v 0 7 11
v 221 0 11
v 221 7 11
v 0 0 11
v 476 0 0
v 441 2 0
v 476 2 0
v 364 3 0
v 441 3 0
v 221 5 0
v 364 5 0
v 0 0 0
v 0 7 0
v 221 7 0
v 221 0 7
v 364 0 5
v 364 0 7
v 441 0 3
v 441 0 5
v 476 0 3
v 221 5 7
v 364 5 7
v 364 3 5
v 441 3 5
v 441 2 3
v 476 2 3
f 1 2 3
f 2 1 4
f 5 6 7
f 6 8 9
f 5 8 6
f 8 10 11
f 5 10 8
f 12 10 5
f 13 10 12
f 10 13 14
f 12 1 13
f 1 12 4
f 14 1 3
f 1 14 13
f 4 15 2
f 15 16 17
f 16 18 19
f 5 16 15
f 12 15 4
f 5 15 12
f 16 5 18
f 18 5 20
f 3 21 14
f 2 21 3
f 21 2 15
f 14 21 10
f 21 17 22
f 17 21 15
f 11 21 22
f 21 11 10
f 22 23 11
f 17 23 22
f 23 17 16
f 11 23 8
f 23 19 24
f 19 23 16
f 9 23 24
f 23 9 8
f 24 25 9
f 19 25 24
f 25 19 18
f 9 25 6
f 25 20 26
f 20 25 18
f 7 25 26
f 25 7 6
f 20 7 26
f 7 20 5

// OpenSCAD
translate([6.5, 3.5, 5.5]) color([0.7000796910311562, 0.6489922579129634, 0.19497362064878687]) cube([13, 7, 11], center=true);
translate([19.5, 3.5, 5.5]) color([0.7834169698984913, 0.7774609885388588, 0.11099692345616674]) cube([13, 7, 11], center=true);
translate([32.5, 3.5, 5.5]) color([0.060160827712116616, 0.7008174245595068, 0.6143308403515266]) cube([13, 7, 11], center=true);
translate([45.5, 3.5, 5.5]) color([0.9339155207415325, 0.6504721799814983, 0.9694854220936419]) cube([13, 7, 11], center=true);
translate([58.5, 3.5, 5.5]) color([0.7136168898793864, 0.2963863893491513, 0.8491315553121948]) cube([13, 7, 11], center=true);
translate([71.5, 3.5, 5.5]) color([0.95846907728749, 0.38764569013819994, 0.29380353478258403]) cube([13, 7, 11], center=true);
translate([84.5, 3.5, 5.5]) color([0.7457841029207014, 0.9575468650535228, 0.98339807845839]) cube([13, 7, 11], center=true);
translate([97.5, 3.5, 5.5]) color([0.12155240415787172, 0.8604321836344089, 0.9958411320233901]) cube([13, 7, 11], center=true);
translate([110.5, 3.5, 5.5]) color([0.03818441020037311, 0.39202639046743215, 0.3715816420064585]) cube([13, 7, 11], center=true);
translate([123.5, 3.5, 5.5]) color([0.19047756087385292, 0.3565538137373233, 0.6320134108911423]) cube([13, 7, 11], center=true);
translate([136.5, 3.5, 5.5]) color([0.9564975354421206, 0.901927522825372, 0.039980675922074105]) cube([13, 7, 11], center=true);
translate([149.5, 3.5, 5.5]) color([0.2553863294502452, 0.02665600139486224, 0.5200631817170318]) cube([13, 7, 11], center=true);
translate([162.5, 3.5, 5.5]) color([0.5692567569896342, 0.8758772851227178, 0.2296552367022351]) cube([13, 7, 11], center=true);
translate([175.5, 3.5, 5.5]) color([0.7763426439418957, 0.8846860519705121, 0.6274277551427163]) cube([13, 7, 11], center=true);
translate([188.5, 3.5, 5.5]) color([0.5024128608294012, 0.5237115354844265, 0.5071067236759631]) cube([13, 7, 11], center=true);
translate([201.5, 3.5, 5.5]) color([0.9454855480301745, 0.14569042195357562, 0.8918421087116969]) cube([13, 7, 11], center=true);
translate([214.5, 3.5, 5.5]) color([0.42205651792049836, 0.08403205823715598, 0.1047646210762947]) cube([13, 7, 11], center=true);
translate([226.5, 2.5, 3.5]) color([0.06292282863863541, 0.4151614515022839, 0.15615697007089357]) cube([11, 5, 7], center=true);
translate([237.5, 2.5, 3.5]) color([0.9545538427732947, 0.7913428503775491, 0.43108631436838285]) cube([11, 5, 7], center=true);
translate([248.5, 2.5, 3.5]) color([0.41701950900356644, 0.4966247746294912, 0.86405767472269]) cube([11, 5, 7], center=true);
translate([259.5, 2.5, 3.5]) color([0.32449912818180593, 0.25258592574699623, 0.35250302456564797]) cube([11, 5, 7], center=true);
translate([270.5, 2.5, 3.5]) color([0.12137799977699892, 0.691775150815975, 0.34544510653523897]) cube([11, 5, 7], center=true);
translate([281.5, 2.5, 3.5]) color([0.17790766067776254, 0.830270051764872, 0.23049353673314077]) cube([11, 5, 7], center=true);
translate([292.5, 2.5, 3.5]) color([0.3658024748453319, 0.5965890354919068, 0.14329113966210216]) cube([11, 5, 7], center=true);
translate([303.5, 2.5, 3.5]) color([0.003232100641658797, 0.6590184917581017, 0.7321014772226084]) cube([11, 5, 7], center=true);
translate([314.5, 2.5, 3.5]) color([0.9009039411186286, 0.7479768172441763, 0.29326295382626455]) cube([11, 5, 7], center=true);
translate([325.5, 2.5, 3.5]) color([0.6894664766240866, 0.932788033819558, 0.23286310478430694]) cube([11, 5, 7], center=true);
translate([336.5, 2.5, 3.5]) color([0.14188743522012004, 0.4540480681686925, 0.4766939084563374]) cube([11, 5, 7], center=true);
translate([347.5, 2.5, 3.5]) color([0.7074804824528956, 0.2582188407343454, 0.027936242271358158]) cube([11, 5, 7], center=true);
translate([358.5, 2.5, 3.5]) color([0.20812012525081536, 0.33501316214628807, 0.9609071038114427]) cube([11, 5, 7], center=true);
translate([367.5, 1.5, 2.5]) color([0.29634664160852753, 0.8784103092413238, 0.5532045188241876]) cube([7, 3, 5], center=true);
translate([374.5, 1.5, 2.5]) color([0.32698413866792275, 0.5930193960141523, 0.08080901281968078]) cube([7, 3, 5], center=true);
translate([381.5, 1.5, 2.5]) color([0.5332278801564081, 0.30776249733867533, 0.3765889324074634]) cube([7, 3, 5], center=true);
translate([388.5, 1.5, 2.5]) color([0.14692685712634312, 0.1252359956830017, 0.2228174233130471]) cube([7, 3, 5], center=true);
translate([395.5, 1.5, 2.5]) color([0.5083324480268261, 0.23665719296677712, 0.18394442119493715]) cube([7, 3, 5], center=true);
translate([402.5, 1.5, 2.5]) color([0.3724619255943996, 0.6631955135334705, 0.8609746033864751]) cube([7, 3, 5], center=true);
translate([409.5, 1.5, 2.5]) color([0.6012082175951422, 0.3938011681878649, 0.7021695231885549]) cube([7, 3, 5], center=true);
translate([416.5, 1.5, 2.5]) color([0.13202027544551864, 0.29938666187805807, 0.4167493264442593]) cube([7, 3, 5], center=true);
translate([423.5, 1.5, 2.5]) color([0.9263964007964989, 0.5910765187605377, 0.2980281087530109]) cube([7, 3, 5], center=true);
translate([430.5, 1.5, 2.5]) color([0.35456411603507165, 0.24805850121983253, 0.6327789974902275]) cube([7, 3, 5], center=true);
translate([437.5, 1.5, 2.5]) color([0.6370445113549524, 0.5292072971005523, 0.376431751315491]) cube([7, 3, 5], center=true);
translate([443.5, 1.0, 1.5]) color([0.008427608141492793, 0.9619565585865117, 0.901262330417864]) cube([5, 2, 3], center=true);
translate([448.5, 1.0, 1.5]) color([0.44129738363616366, 0.3715965769686672, 0.9523409342086877]) cube([5, 2, 3], center=true);
translate([453.5, 1.0, 1.5]) color([0.09105648808381206, 0.18545820412424963, 0.10861526636012075]) cube([5, 2, 3], center=true);
translate([458.5, 1.0, 1.5]) color([0.11215874223546374, 0.6055458611860893, 0.15387883630139487]) cube([5, 2, 3], center=true);
translate([463.5, 1.0, 1.5]) color([0.7025980908137885, 0.928268212070889, 0.18538068806857422]) cube([5, 2, 3], center=true);
translate([468.5, 1.0, 1.5]) color([0.42170431041506296, 0.1747372019883816, 0.9595322940755414]) cube([5, 2, 3], center=true);
translate([473.5, 1.0, 1.5]) color([0.3403879026852894, 0.5233486454380116, 0.35536744790103547]) cube([5, 2, 3], center=true);
